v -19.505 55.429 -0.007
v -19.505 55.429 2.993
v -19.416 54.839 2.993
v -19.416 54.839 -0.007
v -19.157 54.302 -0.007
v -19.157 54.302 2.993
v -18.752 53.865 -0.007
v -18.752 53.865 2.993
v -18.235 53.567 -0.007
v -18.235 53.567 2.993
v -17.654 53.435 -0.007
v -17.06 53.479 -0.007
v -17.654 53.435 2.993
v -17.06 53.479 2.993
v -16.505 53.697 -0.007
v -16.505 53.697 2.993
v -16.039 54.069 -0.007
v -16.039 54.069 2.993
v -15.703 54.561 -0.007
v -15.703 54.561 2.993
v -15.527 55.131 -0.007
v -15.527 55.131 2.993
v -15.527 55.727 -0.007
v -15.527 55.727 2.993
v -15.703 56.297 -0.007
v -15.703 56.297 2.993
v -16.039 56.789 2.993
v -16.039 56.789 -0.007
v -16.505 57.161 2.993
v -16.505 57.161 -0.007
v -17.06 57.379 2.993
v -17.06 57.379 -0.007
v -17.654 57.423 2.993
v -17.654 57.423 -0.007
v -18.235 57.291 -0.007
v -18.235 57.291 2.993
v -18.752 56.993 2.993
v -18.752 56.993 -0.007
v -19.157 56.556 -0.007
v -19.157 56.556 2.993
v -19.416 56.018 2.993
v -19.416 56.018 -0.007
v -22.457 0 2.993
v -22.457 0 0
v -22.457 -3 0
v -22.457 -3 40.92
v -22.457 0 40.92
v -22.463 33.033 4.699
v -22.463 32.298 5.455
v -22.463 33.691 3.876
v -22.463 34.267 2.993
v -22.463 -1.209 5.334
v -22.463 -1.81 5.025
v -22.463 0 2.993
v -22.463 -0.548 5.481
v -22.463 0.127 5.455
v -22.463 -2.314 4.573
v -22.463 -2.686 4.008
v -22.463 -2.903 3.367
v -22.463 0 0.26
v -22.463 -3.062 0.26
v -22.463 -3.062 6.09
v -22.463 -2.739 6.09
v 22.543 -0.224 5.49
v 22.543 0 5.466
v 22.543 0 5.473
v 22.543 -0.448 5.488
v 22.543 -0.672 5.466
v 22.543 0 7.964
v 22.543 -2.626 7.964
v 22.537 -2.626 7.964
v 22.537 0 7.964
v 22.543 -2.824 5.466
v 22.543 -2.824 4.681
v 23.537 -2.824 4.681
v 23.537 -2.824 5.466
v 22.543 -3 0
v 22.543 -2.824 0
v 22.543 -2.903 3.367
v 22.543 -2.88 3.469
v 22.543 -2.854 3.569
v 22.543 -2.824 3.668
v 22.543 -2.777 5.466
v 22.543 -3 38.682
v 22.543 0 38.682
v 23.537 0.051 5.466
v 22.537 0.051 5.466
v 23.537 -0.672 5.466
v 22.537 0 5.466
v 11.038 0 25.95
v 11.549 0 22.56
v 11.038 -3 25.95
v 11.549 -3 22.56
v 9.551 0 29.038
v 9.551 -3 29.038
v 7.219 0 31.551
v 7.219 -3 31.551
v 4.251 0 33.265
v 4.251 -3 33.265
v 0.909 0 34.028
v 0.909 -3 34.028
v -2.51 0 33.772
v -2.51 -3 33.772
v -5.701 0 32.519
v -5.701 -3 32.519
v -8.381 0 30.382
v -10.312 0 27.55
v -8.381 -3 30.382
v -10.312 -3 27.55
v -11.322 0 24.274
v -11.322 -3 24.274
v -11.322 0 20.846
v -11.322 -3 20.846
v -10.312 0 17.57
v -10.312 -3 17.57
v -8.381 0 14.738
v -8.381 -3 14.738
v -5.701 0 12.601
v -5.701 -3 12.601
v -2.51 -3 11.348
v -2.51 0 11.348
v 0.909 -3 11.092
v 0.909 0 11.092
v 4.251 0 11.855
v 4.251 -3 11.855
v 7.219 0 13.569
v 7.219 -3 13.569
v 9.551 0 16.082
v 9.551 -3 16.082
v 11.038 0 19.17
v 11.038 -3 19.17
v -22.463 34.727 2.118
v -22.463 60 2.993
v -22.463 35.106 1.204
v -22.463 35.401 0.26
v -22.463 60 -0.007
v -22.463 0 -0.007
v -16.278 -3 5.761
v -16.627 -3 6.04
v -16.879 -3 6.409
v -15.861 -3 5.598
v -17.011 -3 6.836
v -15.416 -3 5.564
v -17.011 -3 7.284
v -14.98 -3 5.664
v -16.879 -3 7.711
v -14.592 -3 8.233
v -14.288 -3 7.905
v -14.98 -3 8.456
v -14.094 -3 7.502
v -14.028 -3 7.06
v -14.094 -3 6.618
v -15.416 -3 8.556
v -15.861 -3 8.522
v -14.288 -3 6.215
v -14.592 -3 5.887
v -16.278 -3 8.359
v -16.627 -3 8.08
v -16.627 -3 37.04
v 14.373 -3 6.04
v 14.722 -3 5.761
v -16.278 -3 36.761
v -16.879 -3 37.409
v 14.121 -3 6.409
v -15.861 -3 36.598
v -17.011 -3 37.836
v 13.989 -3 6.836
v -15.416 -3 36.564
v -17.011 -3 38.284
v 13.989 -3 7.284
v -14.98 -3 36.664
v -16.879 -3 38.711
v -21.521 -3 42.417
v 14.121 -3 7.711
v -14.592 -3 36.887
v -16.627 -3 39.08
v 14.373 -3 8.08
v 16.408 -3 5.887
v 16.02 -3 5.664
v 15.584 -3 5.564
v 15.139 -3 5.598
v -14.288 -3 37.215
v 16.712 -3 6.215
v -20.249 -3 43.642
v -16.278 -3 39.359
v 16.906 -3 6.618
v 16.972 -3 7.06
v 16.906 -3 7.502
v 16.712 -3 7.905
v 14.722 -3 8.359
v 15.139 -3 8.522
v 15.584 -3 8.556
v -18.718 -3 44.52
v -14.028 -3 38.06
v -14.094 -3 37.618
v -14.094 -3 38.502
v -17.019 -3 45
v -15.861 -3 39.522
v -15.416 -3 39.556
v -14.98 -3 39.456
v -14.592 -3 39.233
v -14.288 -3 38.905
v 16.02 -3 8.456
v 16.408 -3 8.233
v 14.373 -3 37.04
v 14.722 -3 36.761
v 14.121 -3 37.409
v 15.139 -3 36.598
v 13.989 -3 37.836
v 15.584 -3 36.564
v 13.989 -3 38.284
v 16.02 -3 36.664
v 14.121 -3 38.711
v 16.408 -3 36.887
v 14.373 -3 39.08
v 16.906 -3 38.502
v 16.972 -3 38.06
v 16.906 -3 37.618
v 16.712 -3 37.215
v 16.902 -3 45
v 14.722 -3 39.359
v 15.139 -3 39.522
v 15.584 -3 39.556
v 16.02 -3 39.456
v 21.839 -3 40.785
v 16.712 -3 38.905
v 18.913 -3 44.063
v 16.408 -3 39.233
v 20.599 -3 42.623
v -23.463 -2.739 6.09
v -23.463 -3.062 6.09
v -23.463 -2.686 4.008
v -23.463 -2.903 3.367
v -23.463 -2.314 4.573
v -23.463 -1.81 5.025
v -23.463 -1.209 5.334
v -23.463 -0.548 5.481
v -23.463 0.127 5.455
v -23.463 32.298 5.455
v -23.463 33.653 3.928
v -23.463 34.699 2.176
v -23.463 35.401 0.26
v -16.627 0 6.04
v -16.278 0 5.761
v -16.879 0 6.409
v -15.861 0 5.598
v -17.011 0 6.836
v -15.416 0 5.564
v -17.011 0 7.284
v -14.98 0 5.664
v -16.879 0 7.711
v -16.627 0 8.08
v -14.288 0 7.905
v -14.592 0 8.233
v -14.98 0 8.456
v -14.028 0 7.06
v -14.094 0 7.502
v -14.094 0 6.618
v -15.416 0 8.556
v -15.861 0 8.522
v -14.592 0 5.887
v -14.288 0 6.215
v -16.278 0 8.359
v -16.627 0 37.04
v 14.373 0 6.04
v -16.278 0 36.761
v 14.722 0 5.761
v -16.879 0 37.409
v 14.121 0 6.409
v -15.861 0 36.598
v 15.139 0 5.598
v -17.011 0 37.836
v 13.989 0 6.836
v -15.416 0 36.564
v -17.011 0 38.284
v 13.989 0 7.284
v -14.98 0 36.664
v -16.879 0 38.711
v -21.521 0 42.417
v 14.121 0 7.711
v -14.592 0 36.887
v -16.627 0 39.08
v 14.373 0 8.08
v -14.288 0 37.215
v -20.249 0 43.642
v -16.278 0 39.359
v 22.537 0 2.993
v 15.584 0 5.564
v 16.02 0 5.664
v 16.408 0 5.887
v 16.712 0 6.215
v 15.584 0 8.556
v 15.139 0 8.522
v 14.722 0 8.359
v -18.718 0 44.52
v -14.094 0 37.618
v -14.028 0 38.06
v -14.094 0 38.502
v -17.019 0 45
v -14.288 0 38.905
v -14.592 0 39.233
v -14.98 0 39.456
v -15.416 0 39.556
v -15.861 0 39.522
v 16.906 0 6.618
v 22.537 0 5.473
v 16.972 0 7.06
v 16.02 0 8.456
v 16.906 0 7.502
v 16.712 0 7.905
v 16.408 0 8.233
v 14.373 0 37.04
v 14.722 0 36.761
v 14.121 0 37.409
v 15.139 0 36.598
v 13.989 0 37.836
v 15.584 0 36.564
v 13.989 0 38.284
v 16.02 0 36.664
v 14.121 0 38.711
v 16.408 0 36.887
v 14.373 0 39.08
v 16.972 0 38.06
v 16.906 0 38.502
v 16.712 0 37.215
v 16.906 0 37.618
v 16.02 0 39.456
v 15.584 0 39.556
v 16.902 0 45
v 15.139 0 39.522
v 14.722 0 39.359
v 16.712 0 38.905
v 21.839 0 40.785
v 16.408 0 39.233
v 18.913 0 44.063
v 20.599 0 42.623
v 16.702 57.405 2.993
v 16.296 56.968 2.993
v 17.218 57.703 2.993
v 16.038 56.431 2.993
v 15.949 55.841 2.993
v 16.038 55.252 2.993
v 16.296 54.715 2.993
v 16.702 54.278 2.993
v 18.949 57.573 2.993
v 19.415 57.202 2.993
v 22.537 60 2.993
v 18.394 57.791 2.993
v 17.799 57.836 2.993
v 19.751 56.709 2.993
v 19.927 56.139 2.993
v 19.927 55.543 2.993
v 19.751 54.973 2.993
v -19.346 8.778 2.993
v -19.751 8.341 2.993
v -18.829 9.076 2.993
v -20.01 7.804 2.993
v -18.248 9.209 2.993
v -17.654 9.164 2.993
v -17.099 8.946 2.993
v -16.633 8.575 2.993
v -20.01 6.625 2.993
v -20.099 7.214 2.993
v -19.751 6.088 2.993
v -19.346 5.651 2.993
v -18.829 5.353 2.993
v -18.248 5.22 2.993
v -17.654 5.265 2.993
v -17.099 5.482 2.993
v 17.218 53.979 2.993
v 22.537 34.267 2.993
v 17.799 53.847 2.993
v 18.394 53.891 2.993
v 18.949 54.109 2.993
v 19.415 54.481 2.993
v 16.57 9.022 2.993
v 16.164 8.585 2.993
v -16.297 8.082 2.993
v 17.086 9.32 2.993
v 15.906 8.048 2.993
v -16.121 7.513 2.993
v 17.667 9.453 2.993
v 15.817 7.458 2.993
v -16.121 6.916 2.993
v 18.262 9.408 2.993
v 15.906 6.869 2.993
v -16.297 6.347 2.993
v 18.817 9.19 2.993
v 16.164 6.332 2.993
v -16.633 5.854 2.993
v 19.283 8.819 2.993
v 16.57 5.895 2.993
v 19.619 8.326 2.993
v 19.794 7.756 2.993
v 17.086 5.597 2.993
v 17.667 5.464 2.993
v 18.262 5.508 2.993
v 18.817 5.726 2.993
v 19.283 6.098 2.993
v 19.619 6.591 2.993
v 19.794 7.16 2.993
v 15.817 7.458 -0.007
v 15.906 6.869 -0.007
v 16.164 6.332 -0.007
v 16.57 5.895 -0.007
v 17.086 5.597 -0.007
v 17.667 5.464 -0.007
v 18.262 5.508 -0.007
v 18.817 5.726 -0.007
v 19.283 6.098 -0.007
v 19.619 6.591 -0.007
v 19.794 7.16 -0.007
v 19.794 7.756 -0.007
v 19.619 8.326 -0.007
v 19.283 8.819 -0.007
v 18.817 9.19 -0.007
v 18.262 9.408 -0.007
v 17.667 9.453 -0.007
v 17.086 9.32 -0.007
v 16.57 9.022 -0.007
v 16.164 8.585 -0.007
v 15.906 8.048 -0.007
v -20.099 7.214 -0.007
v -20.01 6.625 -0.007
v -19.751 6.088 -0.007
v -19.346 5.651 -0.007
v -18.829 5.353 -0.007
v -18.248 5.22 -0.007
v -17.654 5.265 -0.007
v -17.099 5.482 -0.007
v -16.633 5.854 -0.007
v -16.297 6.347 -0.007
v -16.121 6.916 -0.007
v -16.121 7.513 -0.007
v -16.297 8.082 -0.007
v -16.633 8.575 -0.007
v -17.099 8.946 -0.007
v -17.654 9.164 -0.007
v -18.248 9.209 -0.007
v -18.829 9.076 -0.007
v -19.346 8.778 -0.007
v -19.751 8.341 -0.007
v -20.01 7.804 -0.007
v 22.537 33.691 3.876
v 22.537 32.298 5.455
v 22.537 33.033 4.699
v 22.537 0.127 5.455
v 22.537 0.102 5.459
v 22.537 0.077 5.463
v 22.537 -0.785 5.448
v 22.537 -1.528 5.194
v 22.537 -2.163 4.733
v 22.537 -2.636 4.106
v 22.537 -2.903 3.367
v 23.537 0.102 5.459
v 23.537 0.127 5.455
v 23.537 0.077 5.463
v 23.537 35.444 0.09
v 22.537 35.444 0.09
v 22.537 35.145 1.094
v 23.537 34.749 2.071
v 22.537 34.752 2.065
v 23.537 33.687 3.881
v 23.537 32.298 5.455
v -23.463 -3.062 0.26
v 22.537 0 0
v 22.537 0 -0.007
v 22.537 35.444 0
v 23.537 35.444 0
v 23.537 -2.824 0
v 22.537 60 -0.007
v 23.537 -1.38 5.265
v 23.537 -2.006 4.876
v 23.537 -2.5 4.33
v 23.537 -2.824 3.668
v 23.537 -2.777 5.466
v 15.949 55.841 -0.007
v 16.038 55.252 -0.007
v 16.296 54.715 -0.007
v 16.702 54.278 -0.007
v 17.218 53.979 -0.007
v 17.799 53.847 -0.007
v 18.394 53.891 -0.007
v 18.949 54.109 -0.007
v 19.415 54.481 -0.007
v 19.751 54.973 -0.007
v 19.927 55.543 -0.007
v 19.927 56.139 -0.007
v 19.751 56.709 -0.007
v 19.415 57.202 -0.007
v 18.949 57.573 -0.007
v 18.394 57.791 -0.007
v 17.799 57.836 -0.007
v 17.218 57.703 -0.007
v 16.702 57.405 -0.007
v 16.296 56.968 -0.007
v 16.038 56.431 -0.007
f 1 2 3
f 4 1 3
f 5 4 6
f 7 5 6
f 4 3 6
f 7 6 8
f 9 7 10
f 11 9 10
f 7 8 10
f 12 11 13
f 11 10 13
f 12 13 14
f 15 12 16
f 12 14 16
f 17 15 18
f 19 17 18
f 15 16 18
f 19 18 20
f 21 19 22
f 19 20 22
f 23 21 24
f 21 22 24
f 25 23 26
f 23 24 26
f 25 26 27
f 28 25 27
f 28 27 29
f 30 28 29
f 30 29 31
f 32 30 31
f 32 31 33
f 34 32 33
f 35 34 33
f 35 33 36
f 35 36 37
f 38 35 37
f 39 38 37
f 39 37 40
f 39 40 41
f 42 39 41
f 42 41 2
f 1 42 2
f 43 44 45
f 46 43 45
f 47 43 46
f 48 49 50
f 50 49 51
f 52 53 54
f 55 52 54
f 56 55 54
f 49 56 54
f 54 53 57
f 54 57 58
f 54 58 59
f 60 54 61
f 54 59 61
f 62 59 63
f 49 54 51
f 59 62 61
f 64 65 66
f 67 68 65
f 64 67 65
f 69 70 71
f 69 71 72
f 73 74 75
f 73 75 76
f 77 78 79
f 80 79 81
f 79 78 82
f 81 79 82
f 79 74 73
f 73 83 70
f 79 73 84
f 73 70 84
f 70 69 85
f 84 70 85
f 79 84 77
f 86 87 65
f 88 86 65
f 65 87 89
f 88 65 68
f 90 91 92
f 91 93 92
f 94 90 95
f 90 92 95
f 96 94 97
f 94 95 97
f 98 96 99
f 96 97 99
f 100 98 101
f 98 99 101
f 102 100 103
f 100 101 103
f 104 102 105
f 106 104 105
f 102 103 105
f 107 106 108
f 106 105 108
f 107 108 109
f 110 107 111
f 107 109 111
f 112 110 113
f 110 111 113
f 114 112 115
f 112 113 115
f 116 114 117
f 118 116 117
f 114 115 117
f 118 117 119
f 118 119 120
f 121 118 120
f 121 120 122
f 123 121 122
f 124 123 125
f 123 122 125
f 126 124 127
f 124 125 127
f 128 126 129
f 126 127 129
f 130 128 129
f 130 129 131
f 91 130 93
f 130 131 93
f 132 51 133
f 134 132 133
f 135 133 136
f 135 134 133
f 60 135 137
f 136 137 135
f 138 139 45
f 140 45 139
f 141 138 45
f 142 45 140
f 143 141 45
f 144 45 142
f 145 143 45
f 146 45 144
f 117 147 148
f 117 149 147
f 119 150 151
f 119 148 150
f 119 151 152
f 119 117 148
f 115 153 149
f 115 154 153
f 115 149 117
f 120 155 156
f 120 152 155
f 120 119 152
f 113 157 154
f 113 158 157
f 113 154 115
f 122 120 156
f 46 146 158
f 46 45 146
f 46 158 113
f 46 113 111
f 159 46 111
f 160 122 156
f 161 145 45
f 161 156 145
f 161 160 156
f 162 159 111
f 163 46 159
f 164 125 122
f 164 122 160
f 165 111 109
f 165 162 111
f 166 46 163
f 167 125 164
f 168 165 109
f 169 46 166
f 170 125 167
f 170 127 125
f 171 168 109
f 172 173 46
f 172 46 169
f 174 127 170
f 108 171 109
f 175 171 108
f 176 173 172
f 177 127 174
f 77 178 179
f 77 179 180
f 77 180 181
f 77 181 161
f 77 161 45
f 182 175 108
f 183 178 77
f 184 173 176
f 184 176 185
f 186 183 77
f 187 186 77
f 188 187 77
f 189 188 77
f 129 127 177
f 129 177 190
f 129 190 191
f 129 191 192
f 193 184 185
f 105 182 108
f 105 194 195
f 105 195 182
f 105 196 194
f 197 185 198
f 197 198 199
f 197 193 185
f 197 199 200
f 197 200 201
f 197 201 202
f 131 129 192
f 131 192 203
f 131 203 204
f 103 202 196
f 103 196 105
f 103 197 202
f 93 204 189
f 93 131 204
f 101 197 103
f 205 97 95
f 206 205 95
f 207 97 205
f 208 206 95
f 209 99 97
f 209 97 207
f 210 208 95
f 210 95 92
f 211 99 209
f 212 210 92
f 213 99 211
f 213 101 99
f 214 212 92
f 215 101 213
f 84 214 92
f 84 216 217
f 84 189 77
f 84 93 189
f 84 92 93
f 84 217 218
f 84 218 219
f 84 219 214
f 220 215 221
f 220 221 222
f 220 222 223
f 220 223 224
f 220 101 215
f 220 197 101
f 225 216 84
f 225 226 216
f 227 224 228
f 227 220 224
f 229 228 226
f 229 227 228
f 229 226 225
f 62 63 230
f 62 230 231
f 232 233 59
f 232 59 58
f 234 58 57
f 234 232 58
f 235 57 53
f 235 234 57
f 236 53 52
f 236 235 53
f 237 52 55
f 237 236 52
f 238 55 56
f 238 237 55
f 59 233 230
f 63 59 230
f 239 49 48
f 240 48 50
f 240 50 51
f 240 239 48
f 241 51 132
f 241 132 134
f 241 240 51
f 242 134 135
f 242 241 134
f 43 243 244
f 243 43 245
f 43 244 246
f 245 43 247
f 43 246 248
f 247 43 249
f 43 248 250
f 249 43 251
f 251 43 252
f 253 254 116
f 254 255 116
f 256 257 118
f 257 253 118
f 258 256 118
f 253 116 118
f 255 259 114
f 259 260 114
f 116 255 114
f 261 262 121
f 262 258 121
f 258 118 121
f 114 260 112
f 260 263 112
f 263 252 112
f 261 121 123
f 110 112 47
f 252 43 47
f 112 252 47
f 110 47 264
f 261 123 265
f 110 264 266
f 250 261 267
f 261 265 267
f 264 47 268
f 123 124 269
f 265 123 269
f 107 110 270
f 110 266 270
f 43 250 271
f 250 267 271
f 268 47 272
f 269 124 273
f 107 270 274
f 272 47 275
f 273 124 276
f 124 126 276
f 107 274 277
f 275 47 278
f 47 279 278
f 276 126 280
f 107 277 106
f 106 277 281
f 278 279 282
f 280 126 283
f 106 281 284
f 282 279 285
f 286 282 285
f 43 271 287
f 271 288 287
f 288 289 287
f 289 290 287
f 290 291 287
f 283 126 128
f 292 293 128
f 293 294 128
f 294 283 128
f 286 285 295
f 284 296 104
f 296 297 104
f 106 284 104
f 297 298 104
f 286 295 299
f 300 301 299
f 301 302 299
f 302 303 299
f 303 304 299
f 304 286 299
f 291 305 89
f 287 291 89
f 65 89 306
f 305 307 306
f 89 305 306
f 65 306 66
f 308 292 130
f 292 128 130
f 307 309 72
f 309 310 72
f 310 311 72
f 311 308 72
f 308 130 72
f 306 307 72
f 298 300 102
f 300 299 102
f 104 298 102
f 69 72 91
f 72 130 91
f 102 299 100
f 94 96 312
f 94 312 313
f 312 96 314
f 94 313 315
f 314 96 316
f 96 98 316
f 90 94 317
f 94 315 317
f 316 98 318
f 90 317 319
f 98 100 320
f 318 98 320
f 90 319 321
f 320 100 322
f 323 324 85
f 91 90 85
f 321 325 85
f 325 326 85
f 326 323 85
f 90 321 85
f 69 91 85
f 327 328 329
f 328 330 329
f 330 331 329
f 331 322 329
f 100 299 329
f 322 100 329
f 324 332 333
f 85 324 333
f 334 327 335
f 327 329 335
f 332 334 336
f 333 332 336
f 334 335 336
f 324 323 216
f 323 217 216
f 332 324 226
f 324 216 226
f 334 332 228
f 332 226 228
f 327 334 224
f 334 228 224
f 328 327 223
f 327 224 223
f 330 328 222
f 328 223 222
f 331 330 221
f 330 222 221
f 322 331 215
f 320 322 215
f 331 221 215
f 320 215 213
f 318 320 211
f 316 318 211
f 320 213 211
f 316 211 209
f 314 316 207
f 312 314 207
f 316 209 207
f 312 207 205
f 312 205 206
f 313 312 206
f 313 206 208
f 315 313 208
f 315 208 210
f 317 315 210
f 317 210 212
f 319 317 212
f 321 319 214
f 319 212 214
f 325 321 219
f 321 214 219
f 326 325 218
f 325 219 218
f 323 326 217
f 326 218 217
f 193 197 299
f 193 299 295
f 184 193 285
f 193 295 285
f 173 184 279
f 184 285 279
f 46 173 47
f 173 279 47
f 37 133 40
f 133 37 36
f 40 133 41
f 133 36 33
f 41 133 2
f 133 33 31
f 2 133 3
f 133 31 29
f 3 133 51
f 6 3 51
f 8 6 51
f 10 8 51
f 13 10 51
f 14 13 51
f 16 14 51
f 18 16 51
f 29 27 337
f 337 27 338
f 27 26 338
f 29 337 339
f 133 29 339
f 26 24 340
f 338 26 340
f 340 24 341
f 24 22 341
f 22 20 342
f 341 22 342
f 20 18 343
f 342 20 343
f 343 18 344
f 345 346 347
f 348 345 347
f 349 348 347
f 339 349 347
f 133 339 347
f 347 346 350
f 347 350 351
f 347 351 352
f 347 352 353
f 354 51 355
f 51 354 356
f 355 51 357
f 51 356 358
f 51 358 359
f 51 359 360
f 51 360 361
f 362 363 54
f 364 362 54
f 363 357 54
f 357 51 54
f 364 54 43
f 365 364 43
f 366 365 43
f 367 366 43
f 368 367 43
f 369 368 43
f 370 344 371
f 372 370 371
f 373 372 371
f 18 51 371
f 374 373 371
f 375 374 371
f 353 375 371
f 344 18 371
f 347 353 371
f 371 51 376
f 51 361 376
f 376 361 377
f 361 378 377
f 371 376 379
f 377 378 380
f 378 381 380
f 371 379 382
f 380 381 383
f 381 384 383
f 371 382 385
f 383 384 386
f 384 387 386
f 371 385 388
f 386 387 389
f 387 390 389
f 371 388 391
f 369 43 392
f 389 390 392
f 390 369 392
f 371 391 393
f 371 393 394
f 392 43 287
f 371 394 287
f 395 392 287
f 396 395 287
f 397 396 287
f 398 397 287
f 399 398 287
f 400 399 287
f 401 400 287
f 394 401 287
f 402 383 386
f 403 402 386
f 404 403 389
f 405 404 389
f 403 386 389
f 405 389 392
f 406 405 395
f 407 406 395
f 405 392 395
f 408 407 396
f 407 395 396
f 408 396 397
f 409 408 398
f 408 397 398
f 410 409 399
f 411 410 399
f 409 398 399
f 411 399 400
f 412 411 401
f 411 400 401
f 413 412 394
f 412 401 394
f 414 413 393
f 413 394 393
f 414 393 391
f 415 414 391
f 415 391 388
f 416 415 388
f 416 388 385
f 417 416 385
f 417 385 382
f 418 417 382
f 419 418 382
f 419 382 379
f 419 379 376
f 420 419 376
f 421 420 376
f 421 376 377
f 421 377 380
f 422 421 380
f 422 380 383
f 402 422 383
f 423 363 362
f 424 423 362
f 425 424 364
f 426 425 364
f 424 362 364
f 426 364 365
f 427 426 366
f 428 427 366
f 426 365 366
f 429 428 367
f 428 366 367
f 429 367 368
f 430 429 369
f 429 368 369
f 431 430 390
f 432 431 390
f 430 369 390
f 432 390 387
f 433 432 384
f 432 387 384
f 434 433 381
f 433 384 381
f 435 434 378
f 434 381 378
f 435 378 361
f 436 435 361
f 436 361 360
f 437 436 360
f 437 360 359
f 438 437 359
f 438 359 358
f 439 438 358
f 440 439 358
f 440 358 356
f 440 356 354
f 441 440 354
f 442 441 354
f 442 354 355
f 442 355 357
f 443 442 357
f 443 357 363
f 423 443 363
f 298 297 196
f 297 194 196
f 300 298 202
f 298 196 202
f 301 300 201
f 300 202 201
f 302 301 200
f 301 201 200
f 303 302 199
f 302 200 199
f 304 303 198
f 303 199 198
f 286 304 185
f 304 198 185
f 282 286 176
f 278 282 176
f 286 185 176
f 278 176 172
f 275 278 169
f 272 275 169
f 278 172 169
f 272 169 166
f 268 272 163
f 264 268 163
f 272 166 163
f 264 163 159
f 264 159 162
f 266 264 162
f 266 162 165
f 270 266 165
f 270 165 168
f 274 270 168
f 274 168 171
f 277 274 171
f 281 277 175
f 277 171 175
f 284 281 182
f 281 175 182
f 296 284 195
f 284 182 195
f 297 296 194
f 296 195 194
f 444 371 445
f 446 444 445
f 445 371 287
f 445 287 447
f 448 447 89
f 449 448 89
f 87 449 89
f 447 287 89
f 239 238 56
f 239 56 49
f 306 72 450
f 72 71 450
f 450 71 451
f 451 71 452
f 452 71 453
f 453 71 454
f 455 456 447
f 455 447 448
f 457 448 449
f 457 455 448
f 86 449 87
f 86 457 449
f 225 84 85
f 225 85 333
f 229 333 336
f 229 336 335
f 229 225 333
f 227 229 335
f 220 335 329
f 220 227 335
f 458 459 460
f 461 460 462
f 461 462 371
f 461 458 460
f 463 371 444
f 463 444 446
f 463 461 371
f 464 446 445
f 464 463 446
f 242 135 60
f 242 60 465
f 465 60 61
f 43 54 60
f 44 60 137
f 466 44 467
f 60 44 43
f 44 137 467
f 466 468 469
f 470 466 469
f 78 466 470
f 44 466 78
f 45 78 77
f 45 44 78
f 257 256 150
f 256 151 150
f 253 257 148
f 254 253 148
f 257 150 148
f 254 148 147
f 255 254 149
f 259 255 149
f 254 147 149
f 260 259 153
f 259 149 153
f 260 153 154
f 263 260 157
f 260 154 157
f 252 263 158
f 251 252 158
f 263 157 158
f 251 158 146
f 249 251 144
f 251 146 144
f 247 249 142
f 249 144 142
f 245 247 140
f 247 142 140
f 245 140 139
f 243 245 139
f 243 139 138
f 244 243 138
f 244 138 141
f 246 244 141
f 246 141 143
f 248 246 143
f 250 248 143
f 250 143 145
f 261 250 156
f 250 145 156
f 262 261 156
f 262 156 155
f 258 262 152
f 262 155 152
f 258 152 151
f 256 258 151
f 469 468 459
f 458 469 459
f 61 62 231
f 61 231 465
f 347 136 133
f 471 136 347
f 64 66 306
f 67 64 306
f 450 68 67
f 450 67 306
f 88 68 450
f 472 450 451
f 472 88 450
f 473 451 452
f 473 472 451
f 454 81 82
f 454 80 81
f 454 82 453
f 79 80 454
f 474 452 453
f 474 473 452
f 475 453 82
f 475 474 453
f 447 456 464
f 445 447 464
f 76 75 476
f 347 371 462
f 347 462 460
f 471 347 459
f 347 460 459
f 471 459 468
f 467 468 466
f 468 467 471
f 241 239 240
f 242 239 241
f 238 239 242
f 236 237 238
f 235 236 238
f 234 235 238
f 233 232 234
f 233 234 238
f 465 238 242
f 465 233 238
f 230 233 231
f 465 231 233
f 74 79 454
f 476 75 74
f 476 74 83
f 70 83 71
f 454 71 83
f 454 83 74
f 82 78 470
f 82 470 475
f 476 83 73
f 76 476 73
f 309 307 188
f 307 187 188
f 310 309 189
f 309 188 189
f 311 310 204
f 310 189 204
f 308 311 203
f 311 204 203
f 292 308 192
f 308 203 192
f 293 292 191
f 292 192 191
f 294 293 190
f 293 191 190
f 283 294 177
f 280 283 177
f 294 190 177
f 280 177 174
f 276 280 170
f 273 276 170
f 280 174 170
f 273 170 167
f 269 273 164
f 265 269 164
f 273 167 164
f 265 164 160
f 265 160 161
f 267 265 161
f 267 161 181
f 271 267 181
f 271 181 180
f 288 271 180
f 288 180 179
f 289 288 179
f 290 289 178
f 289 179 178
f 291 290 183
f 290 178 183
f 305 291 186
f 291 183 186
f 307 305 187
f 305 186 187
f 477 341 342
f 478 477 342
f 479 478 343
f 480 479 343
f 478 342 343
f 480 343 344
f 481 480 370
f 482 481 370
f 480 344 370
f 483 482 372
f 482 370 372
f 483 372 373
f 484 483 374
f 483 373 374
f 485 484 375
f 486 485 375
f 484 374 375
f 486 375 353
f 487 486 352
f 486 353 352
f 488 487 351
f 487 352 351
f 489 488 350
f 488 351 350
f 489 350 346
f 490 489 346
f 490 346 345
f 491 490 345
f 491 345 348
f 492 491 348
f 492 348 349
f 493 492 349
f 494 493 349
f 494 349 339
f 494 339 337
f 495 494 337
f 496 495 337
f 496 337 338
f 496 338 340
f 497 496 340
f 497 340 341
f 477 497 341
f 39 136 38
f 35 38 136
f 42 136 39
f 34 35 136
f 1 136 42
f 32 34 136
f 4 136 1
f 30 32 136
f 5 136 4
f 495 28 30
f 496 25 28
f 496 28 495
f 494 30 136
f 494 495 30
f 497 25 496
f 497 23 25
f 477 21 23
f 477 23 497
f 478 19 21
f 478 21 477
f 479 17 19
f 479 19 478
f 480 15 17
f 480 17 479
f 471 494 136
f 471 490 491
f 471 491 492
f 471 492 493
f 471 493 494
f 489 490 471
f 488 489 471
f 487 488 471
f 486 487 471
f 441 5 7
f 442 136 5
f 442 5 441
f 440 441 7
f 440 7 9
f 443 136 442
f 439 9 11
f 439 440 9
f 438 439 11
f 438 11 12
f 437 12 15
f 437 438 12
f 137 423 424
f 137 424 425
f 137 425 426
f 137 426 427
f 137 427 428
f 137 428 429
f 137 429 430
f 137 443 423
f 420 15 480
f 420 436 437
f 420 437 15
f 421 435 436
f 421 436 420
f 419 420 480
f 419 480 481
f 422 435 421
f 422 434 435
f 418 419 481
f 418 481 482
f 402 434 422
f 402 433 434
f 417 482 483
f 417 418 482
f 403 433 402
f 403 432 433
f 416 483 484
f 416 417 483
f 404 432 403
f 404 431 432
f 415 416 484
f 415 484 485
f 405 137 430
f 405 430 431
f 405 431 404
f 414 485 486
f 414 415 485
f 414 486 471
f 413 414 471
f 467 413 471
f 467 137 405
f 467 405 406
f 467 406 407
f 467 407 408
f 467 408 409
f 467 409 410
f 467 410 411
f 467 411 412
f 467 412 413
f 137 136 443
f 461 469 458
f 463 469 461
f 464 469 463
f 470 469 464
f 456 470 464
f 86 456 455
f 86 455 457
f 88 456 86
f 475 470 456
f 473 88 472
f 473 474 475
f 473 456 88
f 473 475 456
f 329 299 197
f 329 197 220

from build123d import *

# Parameters (mm, degrees)
SKETCH_W        = 45
SKETCH_H        = 45
PAD_DEPTH       = 3
SKETCH007_W     = 45
SKETCH007_H     = 3
PAD001_DEPTH    = 60
POCKET_DEPTH    = 2.5
SKETCH004_R     = 11.5
SKETCH004_R_2   = 1.5
POCKET001_DEPTH = 3
SKETCH005_R     = 2
POCKET002_DEPTH = 5
SKETCH008_W     = 5.466466
SKETCH008_H     = 38.267721
PAD002_DEPTH    = 1
POCKET003_DEPTH = 1
SKETCH010_W     = 5.830426
SKETCH010_H     = 38.5055
PAD003_DEPTH    = 1
POCKET004_DEPTH = 1


with BuildPart() as part:
    # Sketch → Pad (new body)
    with BuildSketch(Plane.XZ):
        with Locations((0.043154, 22.5)):
            Rectangle(SKETCH_W, SKETCH_H)
    extrude(amount=PAD_DEPTH)

    # Sketch007 (on Face5 of Pad) → Pad001 (join)
    with BuildSketch(Plane(origin=(0, 0, 0), x_dir=(1, 0, 0), z_dir=(0, 1, 0))):
        with Locations((0.036956, -1.493426)):
            Rectangle(SKETCH007_W, SKETCH007_H)
    extrude(amount=PAD001_DEPTH)

    # Sketch003 → Pocket (cut, symmetric)
    with BuildSketch(Plane.XZ.offset(2)):
        with BuildLine():
            ThreePointArc((-16.103364, 45.081264), (-21.082356, 42.909937), (-23.129993, 37.878814))
            Line((-23.129993, 37.878814), (-23.129993, 45.081264))
            Line((-16.103364, 45.081264), (-23.129993, 45.081264))
        make_face()
        with BuildLine():
            ThreePointArc((22.687422, 37.148395), (20.279616, 42.961353), (14.466658, 45.369159))
            Line((14.466658, 45.369159), (22.687422, 45.369159))
            Line((22.687422, 37.148395), (22.687422, 45.369159))
        make_face()
    extrude(amount=POCKET_DEPTH, both=True, mode=Mode.SUBTRACT)

    # Sketch004 → Pocket001 (cut, symmetric)
    with BuildSketch(Plane.XZ.offset(2)):
        with Locations((0.049257, 22.56)):
            Circle(SKETCH004_R)
        with Locations((15.472322, 7.06)):
            Circle(SKETCH004_R_2)
        with Locations((-15.527678, 38.06)):
            Circle(SKETCH004_R_2)
        with Locations((15.472322, 38.06)):
            Circle(SKETCH004_R_2)
        with Locations((-15.527678, 7.06)):
            Circle(SKETCH004_R_2)
    extrude(amount=POCKET001_DEPTH, both=True, mode=Mode.SUBTRACT)

    # Sketch005 → Pocket002 (cut)
    with BuildSketch(Plane(origin=(0, 0, 3), x_dir=(-1, 0, 0), z_dir=(0, 0, 1))):
        with Locations((-17.816827, -7.458325)):
            Circle(SKETCH005_R)
        with Locations((18.098759, -7.214429)):
            Circle(SKETCH005_R)
        with Locations((-17.948954, -55.841232)):
            Circle(SKETCH005_R)
        with Locations((17.504663, -55.428982)):
            Circle(SKETCH005_R)
    extrude(amount=-POCKET002_DEPTH, mode=Mode.SUBTRACT)

    # Sketch008 (on Face11 of Pocket002) → Pad002 (join)
    with BuildSketch(Plane(origin=(22.536956, 0, 0), x_dir=(0, 0, 1), z_dir=(1, 0, 0))):
        with Locations((2.733233, -16.310083)):
            Rectangle(SKETCH008_W, SKETCH008_H)
    extrude(amount=PAD002_DEPTH)

    # Sketch009 (on Face27 of Pad002) → Pocket003 (cut)
    with BuildSketch(Plane(origin=(23.536956, 0, 0), x_dir=(0, 0, 1), z_dir=(1, 0, 0))):
        with BuildLine():
            ThreePointArc((5.454798, -0.127493), (5.024588, 1.810299), (3.367288, 2.902761))
            Line((3.367288, 2.902761), (7.963681, 2.626362))
            Line((7.963681, 2.626362), (7.963681, -32.524605))
            Line((7.963681, -32.524605), (6.482224, -36.026234))
            Line((6.482224, -36.026234), (0, -35.465638))
            ThreePointArc((0, -35.465638), (2.96164, -34.285148), (5.454798, -32.297931))
            Line((5.454798, -0.127493), (5.454798, -32.297931))
        make_face()
    extrude(amount=-POCKET003_DEPTH, mode=Mode.SUBTRACT)

    # Sketch010 (on Face2 of Pocket003) → Pad003 (join)
    with BuildSketch(Plane(origin=(-22.463044, 0, 0), x_dir=(0, 0, -1), z_dir=(-1, 0, 0))):
        with Locations((-3.174851, -16.191193)):
            Rectangle(SKETCH010_W, SKETCH010_H)
    extrude(amount=PAD003_DEPTH)

    # Sketch011 (on Face27 of Pad003) → Pocket004 (cut)
    with BuildSketch(Plane(origin=(-23.463044, 0, 0), x_dir=(0, 0, -1), z_dir=(-1, 0, 0))):
        with BuildLine():
            ThreePointArc((-3.367288, 2.902761), (-5.024589, 1.810299), (-5.454799, -0.127493))
            Line((-5.454799, -0.127493), (-5.454799, -32.297931))
            ThreePointArc((-5.454799, -32.297931), (-2.961641, -34.285149), (0, -35.465639))
            Line((-6.482224, -36.026234), (0, -35.465639))
            Line((-7.963681, -32.524605), (-6.482224, -36.026234))
            Line((-7.963681, 2.626362), (-7.963681, -32.524605))
            Line((-3.367288, 2.902761), (-7.963681, 2.626362))
        make_face()
    extrude(amount=-POCKET004_DEPTH, mode=Mode.SUBTRACT)


solid = part.part
